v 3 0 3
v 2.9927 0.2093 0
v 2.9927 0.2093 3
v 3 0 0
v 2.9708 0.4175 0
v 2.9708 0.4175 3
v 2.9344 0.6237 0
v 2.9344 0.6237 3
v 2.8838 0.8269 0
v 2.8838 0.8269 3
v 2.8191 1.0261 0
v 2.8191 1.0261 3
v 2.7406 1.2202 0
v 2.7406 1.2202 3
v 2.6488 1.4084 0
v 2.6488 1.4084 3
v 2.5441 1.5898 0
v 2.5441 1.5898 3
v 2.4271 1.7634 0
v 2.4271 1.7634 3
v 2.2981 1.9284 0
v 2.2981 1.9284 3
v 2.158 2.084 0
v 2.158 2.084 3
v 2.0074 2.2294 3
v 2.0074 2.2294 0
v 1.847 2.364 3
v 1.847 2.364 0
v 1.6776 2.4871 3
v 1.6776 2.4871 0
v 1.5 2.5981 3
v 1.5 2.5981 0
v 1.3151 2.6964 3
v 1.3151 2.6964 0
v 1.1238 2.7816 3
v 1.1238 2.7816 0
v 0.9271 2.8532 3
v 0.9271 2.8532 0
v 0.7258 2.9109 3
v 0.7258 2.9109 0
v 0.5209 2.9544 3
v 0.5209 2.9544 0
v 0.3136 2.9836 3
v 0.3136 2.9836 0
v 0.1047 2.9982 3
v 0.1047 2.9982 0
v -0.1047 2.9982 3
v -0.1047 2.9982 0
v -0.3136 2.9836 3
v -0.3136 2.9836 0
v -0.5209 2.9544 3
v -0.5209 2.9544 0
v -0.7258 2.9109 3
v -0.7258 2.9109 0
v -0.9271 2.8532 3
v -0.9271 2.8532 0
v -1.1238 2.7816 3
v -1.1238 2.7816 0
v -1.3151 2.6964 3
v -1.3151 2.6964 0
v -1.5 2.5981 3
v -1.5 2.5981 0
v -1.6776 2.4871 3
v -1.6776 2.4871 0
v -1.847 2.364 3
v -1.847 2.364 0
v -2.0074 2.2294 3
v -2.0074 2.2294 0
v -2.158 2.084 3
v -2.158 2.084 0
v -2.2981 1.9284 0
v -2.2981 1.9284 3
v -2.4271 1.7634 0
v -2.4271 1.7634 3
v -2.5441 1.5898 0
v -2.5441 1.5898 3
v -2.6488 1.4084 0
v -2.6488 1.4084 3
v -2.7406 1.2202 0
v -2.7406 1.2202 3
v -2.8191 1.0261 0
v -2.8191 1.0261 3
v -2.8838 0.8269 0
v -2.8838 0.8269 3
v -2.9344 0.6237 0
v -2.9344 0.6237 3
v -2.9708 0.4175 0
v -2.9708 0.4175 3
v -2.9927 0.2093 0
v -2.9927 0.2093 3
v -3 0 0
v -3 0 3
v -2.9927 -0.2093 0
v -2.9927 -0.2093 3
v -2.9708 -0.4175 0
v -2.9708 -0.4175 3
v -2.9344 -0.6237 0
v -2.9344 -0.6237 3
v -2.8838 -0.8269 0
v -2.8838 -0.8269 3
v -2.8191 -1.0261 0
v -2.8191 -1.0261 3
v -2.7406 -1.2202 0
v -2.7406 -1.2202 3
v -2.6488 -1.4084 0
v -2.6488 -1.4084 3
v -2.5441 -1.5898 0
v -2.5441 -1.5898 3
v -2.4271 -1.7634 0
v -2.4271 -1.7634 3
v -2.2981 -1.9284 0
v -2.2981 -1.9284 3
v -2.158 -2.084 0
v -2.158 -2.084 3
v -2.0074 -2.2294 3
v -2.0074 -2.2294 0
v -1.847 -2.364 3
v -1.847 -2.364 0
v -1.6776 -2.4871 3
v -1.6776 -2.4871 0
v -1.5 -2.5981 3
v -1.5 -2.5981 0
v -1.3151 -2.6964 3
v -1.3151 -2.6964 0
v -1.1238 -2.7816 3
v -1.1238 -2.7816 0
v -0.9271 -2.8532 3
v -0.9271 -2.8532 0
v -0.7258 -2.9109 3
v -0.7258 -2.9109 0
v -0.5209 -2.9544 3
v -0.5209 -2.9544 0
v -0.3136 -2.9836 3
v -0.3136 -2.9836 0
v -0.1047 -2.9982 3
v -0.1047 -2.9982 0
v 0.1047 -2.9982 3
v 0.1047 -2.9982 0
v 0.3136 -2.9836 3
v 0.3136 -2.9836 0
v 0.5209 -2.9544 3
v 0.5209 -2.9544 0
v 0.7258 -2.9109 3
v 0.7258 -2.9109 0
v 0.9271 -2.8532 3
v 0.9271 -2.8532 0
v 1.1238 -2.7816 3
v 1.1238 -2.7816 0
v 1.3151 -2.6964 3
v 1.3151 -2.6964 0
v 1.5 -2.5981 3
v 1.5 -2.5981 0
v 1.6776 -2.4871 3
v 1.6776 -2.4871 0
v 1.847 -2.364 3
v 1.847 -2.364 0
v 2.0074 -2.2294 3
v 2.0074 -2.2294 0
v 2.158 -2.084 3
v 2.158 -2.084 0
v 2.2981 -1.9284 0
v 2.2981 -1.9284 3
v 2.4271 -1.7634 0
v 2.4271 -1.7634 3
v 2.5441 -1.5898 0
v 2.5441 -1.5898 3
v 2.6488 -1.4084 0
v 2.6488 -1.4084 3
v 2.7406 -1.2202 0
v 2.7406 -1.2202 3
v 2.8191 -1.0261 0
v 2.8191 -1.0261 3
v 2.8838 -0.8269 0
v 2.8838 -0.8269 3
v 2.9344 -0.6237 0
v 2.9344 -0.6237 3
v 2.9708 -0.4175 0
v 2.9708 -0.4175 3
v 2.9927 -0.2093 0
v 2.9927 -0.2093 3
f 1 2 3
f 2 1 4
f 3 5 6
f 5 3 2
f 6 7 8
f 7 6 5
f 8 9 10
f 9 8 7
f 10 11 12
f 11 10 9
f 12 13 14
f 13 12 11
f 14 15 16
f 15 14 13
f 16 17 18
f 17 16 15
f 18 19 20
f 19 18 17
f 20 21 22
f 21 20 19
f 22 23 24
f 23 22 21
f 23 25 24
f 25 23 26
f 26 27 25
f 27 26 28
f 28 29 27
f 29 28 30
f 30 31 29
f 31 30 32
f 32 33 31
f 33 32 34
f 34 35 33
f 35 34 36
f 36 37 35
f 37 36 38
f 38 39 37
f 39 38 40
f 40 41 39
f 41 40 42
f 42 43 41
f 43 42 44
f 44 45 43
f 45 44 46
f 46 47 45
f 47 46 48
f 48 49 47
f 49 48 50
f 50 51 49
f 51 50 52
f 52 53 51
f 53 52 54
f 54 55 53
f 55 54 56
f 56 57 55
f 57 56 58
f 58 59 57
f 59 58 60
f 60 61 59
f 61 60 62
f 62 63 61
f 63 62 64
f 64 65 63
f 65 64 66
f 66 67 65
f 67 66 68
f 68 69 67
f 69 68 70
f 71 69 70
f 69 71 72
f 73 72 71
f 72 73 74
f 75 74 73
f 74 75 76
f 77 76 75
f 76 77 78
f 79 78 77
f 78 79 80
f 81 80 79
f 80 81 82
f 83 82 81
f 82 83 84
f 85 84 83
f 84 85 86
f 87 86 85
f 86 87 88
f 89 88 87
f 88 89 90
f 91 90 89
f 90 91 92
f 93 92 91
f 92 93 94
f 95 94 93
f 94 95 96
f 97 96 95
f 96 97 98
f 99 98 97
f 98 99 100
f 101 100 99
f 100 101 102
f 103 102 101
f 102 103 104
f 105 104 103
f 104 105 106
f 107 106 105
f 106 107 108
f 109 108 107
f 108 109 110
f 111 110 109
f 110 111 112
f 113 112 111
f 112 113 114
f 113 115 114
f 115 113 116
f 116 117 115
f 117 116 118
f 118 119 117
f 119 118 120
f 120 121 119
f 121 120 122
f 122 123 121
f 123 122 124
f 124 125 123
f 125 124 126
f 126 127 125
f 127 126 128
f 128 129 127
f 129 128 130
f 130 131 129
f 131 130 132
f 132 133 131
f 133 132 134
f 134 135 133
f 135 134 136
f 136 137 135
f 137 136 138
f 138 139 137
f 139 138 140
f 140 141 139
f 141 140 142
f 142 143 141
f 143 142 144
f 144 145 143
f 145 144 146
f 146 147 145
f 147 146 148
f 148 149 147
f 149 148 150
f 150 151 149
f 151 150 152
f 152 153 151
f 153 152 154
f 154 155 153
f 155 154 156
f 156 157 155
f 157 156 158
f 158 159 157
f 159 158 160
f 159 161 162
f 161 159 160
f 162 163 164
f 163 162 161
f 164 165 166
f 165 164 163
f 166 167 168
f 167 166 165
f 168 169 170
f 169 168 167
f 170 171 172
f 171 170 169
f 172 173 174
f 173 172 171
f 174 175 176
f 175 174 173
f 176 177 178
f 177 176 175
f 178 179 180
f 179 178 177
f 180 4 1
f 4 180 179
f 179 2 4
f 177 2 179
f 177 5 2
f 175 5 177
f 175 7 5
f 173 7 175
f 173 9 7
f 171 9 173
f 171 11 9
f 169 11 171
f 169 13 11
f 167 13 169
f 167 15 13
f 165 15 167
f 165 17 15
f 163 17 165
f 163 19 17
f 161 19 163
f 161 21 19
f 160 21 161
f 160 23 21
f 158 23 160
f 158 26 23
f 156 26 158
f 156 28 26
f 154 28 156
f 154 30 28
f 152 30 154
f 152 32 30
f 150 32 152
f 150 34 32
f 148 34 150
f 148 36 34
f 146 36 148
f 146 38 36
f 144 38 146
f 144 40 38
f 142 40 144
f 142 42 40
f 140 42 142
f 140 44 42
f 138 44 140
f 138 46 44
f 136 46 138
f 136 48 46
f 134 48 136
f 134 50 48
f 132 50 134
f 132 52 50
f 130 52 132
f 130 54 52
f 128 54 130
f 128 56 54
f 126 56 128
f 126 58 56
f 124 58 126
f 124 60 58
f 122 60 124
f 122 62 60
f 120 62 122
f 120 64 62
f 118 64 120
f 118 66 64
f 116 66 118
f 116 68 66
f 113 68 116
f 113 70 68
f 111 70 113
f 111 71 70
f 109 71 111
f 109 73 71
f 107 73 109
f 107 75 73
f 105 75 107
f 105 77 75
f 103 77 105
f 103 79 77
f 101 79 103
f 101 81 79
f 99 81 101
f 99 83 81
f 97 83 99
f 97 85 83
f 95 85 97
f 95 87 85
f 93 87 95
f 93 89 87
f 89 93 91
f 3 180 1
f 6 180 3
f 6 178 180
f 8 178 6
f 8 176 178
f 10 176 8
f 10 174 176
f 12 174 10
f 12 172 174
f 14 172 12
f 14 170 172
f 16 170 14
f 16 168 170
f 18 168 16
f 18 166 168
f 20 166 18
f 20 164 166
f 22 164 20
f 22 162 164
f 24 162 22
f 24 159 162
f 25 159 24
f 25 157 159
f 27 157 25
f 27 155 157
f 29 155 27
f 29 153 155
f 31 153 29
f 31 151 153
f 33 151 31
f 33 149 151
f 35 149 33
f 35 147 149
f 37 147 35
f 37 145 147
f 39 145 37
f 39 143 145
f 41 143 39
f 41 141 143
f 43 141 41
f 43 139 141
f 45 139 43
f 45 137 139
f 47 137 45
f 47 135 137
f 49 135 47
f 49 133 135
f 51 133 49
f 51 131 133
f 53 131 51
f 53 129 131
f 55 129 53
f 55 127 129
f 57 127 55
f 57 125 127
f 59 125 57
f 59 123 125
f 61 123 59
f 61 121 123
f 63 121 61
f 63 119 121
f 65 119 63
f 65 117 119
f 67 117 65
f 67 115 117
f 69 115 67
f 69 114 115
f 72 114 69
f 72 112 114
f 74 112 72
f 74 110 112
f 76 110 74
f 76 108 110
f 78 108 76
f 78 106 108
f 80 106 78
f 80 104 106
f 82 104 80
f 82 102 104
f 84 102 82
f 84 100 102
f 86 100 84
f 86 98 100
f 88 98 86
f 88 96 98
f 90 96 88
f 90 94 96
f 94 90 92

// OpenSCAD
magnet($fn=90);
*magnetHole($fn=90);

module magnet(diameter = 6, height = 3) {
  cylinder(d=diameter, h=height);
}

module magnetHole(diameter = 6, height = 3, tolerance = .2) {
  cylinder(d=diameter + tolerance, h=height, center=true);
}
